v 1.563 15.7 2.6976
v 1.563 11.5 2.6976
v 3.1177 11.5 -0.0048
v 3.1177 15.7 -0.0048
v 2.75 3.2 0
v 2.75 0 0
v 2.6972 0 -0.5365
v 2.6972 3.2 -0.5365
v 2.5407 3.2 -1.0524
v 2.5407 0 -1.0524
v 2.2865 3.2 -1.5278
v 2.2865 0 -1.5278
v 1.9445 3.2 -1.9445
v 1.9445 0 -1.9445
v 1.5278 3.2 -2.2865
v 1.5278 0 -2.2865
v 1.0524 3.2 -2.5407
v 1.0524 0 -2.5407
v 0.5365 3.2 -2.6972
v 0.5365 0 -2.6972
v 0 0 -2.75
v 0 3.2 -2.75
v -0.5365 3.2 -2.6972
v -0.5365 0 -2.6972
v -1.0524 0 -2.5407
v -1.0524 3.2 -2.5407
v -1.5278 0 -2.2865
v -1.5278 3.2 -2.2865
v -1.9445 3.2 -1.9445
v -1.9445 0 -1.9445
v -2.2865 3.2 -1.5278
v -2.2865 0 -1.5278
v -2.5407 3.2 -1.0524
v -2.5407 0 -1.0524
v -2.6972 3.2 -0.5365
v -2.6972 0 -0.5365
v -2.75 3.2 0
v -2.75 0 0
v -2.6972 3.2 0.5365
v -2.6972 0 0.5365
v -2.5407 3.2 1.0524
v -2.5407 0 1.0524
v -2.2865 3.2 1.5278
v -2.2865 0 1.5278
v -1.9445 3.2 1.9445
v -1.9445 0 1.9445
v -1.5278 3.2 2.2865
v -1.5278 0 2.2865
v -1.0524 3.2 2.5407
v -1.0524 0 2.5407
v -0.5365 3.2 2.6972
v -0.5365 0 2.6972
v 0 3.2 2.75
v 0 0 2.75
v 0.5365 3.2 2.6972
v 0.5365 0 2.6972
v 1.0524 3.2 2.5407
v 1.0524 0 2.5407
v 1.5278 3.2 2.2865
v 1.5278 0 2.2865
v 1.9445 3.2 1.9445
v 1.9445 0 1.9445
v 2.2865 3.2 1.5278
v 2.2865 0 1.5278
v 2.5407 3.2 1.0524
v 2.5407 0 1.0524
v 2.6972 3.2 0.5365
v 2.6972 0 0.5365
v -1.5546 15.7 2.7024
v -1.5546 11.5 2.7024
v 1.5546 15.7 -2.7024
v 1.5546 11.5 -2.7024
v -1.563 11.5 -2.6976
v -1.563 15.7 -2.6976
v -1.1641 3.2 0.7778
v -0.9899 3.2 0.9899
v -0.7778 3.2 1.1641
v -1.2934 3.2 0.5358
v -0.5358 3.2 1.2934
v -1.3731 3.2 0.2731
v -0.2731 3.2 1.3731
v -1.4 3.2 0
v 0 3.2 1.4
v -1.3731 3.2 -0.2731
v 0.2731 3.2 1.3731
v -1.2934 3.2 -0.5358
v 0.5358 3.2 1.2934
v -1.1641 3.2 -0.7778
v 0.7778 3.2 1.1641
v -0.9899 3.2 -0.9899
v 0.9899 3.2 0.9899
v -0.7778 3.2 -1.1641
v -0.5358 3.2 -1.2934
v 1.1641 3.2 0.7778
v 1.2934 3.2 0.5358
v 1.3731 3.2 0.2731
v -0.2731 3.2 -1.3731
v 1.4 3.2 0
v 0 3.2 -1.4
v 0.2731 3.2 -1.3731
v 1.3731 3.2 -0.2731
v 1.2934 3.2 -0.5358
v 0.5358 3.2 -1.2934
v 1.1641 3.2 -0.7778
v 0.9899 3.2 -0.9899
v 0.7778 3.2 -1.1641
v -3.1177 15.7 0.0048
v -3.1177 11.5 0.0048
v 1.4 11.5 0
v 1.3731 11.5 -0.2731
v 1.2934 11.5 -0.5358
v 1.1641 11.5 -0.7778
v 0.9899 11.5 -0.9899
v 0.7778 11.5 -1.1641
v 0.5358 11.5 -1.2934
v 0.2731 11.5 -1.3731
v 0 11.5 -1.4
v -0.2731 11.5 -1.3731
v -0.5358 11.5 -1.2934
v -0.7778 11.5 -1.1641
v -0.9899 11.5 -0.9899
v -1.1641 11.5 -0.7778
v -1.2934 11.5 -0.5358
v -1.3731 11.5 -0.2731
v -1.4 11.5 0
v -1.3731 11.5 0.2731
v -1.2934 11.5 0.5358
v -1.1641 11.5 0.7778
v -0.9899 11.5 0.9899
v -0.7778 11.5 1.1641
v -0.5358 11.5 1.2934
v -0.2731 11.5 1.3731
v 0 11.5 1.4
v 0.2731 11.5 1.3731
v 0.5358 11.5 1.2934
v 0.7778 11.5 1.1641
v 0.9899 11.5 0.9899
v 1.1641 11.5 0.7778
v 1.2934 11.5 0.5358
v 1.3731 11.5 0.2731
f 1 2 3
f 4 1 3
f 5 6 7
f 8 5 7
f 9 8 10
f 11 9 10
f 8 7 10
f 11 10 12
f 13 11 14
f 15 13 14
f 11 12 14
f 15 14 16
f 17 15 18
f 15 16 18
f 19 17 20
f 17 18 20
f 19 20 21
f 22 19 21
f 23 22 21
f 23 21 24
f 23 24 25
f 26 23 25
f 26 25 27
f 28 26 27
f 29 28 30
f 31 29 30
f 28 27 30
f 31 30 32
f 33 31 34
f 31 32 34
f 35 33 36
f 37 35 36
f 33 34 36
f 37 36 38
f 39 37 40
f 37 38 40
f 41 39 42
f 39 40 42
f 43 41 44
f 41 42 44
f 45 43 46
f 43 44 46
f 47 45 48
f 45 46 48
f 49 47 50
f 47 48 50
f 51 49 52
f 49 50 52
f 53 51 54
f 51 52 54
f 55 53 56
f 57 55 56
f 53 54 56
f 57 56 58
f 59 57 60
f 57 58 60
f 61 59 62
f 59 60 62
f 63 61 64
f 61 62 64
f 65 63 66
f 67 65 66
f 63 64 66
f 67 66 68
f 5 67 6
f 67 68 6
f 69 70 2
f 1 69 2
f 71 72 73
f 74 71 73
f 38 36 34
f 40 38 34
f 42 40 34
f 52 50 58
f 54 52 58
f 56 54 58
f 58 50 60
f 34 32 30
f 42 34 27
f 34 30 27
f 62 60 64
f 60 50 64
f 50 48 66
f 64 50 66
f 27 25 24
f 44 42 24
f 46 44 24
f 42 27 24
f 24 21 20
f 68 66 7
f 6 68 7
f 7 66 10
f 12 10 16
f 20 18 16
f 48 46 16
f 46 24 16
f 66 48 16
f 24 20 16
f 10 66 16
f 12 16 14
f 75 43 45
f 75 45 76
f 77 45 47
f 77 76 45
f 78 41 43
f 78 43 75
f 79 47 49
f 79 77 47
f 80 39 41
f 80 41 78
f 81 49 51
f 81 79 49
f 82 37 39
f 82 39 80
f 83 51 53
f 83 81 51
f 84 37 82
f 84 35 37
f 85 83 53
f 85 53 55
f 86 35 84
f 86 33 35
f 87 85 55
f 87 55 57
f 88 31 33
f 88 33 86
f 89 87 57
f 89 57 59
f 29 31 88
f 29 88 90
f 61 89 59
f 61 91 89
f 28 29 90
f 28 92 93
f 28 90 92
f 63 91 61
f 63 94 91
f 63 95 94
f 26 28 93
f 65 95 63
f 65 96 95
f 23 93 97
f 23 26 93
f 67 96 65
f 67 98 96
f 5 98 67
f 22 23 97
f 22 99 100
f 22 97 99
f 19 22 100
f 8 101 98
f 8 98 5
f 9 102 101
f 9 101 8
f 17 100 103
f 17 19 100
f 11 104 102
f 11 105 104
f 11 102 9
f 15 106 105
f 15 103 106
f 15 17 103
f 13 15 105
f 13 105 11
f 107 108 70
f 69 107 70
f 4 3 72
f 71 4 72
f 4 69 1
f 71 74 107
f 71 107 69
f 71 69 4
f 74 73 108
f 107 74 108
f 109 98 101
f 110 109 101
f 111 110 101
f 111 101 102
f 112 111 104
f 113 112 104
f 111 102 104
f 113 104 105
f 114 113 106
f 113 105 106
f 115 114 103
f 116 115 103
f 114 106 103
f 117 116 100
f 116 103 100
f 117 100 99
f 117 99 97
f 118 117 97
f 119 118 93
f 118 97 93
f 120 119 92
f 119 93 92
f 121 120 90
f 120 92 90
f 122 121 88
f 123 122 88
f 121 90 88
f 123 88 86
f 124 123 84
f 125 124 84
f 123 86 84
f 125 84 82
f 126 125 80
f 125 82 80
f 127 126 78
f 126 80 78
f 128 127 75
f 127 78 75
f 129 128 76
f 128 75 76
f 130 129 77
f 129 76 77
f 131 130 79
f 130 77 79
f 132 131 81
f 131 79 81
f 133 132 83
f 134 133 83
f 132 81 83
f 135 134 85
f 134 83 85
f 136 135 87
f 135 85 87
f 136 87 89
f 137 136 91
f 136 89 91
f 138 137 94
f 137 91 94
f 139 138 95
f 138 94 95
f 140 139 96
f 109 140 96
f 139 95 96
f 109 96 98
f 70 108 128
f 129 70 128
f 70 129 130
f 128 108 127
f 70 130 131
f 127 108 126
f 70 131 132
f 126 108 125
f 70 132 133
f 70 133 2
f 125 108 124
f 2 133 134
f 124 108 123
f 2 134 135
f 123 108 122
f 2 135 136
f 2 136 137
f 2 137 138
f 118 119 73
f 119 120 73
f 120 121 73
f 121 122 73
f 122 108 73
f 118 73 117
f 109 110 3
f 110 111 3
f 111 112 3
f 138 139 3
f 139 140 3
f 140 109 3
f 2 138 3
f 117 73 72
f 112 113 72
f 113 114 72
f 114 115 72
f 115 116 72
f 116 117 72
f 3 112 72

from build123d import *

# Parameters (mm, degrees)
SKETCH1_R           = 2.75
BOSS_EXTRUDE1_DEPTH = 3.2
SKETCH2_R           = 1.4
BOSS_EXTRUDE2_DEPTH = 8.3
BOSS_EXTRUDE3_DEPTH = 4.2


with BuildPart() as part:
    # Sketch1 → Boss-Extrude1 (new body)
    with BuildSketch(Plane(origin=(0, 0, 0), x_dir=(1, 0, 0), z_dir=(0, 1, 0))):
        Circle(SKETCH1_R)
    extrude(amount=BOSS_EXTRUDE1_DEPTH)

    # Sketch2 → Boss-Extrude2 (add)
    with BuildSketch(Plane(origin=(0, 3.2, 0), x_dir=(1, 0, 0), z_dir=(0, 1, 0))):
        Circle(SKETCH2_R)
    extrude(amount=BOSS_EXTRUDE2_DEPTH)

    # Sketch3 → Boss-Extrude3 (add)
    with BuildSketch(Plane(origin=(0, 11.5, 0), x_dir=(1, 0, 0), z_dir=(0, 1, 0))):
        Polygon((1.554649618, 2.702418281), (-1.563038074, 2.697575204), (-3.117687692, -0.004843077), (-1.554649618, -2.702418281), (1.563038074, -2.697575204), (3.117687692, 0.004843077), align=None)
    extrude(amount=BOSS_EXTRUDE3_DEPTH)


solid = part.part
